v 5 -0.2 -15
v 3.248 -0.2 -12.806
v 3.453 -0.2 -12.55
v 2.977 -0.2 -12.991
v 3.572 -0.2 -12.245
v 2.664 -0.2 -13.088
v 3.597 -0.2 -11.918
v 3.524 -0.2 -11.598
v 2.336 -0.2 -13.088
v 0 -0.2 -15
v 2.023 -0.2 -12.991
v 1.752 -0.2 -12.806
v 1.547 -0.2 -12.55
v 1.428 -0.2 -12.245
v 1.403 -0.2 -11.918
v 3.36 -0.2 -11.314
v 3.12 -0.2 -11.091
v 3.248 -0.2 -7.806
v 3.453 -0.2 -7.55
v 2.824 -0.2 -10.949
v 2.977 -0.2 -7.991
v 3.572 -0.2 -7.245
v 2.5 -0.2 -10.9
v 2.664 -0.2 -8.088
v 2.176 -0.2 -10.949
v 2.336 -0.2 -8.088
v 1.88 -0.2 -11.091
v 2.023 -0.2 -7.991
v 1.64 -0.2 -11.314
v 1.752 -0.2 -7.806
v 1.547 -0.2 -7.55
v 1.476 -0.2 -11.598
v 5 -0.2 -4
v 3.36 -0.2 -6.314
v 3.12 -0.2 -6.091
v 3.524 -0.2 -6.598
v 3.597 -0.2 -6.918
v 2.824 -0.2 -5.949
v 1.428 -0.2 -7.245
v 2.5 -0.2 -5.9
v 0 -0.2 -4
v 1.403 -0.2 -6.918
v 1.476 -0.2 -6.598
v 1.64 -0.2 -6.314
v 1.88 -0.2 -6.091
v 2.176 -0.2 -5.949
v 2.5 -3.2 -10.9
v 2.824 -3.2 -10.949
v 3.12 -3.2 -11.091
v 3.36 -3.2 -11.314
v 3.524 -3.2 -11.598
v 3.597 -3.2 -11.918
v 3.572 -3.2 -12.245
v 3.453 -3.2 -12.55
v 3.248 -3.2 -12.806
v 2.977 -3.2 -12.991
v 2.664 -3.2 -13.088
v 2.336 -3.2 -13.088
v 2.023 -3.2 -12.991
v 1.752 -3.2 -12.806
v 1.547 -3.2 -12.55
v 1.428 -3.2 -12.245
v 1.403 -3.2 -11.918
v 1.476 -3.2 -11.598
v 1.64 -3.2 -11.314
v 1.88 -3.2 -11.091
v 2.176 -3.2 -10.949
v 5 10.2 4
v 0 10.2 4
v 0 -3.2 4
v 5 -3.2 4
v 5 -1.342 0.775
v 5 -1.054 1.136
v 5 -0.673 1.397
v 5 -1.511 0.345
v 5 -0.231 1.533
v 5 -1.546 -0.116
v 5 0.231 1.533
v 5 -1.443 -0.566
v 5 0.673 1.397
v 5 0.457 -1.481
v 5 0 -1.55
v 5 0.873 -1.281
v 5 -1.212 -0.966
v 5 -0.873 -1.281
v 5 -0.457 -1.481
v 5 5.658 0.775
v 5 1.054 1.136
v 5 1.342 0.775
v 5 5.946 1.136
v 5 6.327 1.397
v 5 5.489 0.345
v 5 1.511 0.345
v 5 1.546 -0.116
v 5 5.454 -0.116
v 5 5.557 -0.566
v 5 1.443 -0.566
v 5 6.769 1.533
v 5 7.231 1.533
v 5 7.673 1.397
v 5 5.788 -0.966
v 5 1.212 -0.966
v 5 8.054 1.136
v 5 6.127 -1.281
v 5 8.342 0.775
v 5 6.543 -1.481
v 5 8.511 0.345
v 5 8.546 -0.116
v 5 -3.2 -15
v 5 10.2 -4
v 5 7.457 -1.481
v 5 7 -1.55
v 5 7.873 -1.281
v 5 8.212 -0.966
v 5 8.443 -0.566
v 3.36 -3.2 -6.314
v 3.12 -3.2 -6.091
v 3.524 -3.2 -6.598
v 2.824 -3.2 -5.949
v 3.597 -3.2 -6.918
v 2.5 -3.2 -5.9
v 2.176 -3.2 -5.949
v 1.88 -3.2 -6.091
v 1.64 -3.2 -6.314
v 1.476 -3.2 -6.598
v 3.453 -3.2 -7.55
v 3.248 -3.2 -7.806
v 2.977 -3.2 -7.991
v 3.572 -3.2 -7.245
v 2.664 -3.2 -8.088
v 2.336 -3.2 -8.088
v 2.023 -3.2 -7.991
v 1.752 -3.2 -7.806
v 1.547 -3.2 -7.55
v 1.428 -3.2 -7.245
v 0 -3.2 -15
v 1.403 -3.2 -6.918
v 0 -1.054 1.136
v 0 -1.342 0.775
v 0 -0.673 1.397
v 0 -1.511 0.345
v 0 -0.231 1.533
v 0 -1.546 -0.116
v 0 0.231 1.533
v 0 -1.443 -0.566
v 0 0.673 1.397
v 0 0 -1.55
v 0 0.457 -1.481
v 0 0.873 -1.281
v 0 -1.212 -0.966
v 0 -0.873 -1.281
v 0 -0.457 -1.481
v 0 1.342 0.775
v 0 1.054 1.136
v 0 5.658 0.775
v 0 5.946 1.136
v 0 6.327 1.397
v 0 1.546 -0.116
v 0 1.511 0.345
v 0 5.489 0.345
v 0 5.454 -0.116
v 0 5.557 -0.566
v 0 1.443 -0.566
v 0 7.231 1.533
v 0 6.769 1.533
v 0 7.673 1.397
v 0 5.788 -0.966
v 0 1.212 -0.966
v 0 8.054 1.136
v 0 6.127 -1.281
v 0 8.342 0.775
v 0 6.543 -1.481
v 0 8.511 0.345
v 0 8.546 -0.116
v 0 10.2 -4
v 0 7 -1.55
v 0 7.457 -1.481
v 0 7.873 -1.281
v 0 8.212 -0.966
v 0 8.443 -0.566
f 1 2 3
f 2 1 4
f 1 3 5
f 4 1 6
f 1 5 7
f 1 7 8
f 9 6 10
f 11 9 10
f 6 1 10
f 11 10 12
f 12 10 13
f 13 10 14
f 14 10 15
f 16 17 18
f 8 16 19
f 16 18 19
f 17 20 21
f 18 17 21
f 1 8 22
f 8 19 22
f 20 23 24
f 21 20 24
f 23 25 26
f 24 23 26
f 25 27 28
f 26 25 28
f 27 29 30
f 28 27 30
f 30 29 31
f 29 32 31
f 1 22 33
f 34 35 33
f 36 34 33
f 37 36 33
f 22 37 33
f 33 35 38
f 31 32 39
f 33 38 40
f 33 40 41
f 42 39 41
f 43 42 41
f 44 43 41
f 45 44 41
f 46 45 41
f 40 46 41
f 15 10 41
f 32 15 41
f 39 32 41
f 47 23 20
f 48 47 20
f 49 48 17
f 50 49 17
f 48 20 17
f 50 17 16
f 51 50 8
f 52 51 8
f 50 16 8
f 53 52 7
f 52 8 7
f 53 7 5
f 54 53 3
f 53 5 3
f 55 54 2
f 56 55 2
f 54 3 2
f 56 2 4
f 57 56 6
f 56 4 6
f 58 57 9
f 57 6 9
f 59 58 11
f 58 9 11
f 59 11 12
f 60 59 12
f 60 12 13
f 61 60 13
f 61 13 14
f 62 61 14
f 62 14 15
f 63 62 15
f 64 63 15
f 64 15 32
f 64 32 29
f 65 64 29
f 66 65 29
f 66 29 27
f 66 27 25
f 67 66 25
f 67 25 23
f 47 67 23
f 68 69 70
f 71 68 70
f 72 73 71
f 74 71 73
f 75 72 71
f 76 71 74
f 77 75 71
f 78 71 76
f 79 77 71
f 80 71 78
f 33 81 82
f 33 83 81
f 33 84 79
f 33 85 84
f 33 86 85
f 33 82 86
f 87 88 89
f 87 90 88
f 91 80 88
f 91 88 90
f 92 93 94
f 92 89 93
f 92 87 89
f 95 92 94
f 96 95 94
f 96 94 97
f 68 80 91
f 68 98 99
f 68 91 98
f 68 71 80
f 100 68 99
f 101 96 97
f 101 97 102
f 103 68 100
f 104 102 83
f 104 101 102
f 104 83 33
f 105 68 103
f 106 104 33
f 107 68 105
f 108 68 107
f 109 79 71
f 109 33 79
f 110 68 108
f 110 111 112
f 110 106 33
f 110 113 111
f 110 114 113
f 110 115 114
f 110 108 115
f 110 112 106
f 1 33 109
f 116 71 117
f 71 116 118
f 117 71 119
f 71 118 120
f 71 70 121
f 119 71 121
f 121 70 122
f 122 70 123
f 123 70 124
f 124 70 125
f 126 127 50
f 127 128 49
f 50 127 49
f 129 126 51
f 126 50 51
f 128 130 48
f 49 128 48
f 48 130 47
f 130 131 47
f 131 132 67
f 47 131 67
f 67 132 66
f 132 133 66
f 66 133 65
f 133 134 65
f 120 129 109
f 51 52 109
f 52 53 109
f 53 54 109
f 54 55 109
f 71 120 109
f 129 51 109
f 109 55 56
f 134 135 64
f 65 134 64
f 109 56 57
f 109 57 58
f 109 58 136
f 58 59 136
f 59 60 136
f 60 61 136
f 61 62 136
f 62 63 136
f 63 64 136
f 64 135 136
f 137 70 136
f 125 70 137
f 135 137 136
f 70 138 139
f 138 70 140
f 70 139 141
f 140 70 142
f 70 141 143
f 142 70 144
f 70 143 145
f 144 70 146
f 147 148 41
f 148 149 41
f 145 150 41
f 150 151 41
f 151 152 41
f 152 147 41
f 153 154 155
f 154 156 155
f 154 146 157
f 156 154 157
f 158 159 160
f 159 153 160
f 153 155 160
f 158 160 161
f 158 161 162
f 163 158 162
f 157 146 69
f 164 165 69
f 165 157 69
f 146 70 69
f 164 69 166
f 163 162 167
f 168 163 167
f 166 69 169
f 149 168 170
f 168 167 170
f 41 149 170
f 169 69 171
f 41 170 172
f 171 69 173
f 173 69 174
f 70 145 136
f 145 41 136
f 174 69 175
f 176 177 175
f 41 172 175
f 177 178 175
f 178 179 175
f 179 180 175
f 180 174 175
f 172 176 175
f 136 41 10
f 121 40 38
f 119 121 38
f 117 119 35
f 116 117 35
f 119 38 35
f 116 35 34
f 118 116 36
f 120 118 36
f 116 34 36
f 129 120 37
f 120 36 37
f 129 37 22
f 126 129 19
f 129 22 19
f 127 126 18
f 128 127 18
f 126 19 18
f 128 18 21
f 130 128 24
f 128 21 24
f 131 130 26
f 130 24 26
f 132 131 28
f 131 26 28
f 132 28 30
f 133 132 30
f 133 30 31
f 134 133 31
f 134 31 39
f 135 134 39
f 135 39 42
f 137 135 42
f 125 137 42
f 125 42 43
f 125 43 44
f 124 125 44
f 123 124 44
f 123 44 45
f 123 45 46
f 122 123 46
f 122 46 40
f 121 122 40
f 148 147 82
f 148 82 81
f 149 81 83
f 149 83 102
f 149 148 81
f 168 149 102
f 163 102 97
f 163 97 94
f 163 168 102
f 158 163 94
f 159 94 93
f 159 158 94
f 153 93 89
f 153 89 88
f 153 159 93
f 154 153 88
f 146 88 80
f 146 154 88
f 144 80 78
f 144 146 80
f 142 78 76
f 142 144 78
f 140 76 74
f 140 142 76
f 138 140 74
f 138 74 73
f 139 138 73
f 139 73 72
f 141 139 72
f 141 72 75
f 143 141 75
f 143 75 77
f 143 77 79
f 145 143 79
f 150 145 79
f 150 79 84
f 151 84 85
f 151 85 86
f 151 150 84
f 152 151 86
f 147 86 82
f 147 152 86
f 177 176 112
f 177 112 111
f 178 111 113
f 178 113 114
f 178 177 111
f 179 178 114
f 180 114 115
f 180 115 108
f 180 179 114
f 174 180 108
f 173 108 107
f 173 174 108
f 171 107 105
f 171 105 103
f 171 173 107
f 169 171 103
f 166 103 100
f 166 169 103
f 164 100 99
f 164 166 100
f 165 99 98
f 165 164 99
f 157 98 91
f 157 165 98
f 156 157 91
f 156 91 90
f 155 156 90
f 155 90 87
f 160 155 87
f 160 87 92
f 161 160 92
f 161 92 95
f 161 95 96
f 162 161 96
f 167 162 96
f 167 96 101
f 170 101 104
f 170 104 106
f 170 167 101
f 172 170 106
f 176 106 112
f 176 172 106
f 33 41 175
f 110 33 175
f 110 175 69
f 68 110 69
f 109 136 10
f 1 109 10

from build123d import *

# Parameters (mm, degrees)
SKETCH_1_R          = 1.55
EXTRUDE_1_DEPTH     = 5
SKETCH_2_R          = 1.1
CUT_EXTRUDE_1_DEPTH = 5


with BuildPart() as part:
    # 草图1 → 凸台-拉伸1 (new body)
    with BuildSketch(Plane(origin=(0, 0, 0), x_dir=(0, 0, -1), z_dir=(1, 0, 0))):
        Polygon((-4, 10.2), (-4, -3.2), (15, -3.2), (15, -0.2), (4, -0.2), (4, 10.2), align=None)
        Circle(SKETCH_1_R, mode=Mode.SUBTRACT)
        with Locations((0, 7)):
            Circle(SKETCH_1_R, mode=Mode.SUBTRACT)
    extrude(amount=EXTRUDE_1_DEPTH)

    # 草图2 → 切除-拉伸1 (cut)
    with BuildSketch(Plane(origin=(0, -0.2, 0), x_dir=(1, 0, 0), z_dir=(0, 1, 0))):
        with Locations(Location((2.5, 7, 0), (0, 0, 270))):
            Circle(SKETCH_2_R)
        with Locations(Location((2.5, 12, 0), (0, 0, 270))):
            Circle(SKETCH_2_R)
    extrude(amount=-CUT_EXTRUDE_1_DEPTH, mode=Mode.SUBTRACT)


solid = part.part
